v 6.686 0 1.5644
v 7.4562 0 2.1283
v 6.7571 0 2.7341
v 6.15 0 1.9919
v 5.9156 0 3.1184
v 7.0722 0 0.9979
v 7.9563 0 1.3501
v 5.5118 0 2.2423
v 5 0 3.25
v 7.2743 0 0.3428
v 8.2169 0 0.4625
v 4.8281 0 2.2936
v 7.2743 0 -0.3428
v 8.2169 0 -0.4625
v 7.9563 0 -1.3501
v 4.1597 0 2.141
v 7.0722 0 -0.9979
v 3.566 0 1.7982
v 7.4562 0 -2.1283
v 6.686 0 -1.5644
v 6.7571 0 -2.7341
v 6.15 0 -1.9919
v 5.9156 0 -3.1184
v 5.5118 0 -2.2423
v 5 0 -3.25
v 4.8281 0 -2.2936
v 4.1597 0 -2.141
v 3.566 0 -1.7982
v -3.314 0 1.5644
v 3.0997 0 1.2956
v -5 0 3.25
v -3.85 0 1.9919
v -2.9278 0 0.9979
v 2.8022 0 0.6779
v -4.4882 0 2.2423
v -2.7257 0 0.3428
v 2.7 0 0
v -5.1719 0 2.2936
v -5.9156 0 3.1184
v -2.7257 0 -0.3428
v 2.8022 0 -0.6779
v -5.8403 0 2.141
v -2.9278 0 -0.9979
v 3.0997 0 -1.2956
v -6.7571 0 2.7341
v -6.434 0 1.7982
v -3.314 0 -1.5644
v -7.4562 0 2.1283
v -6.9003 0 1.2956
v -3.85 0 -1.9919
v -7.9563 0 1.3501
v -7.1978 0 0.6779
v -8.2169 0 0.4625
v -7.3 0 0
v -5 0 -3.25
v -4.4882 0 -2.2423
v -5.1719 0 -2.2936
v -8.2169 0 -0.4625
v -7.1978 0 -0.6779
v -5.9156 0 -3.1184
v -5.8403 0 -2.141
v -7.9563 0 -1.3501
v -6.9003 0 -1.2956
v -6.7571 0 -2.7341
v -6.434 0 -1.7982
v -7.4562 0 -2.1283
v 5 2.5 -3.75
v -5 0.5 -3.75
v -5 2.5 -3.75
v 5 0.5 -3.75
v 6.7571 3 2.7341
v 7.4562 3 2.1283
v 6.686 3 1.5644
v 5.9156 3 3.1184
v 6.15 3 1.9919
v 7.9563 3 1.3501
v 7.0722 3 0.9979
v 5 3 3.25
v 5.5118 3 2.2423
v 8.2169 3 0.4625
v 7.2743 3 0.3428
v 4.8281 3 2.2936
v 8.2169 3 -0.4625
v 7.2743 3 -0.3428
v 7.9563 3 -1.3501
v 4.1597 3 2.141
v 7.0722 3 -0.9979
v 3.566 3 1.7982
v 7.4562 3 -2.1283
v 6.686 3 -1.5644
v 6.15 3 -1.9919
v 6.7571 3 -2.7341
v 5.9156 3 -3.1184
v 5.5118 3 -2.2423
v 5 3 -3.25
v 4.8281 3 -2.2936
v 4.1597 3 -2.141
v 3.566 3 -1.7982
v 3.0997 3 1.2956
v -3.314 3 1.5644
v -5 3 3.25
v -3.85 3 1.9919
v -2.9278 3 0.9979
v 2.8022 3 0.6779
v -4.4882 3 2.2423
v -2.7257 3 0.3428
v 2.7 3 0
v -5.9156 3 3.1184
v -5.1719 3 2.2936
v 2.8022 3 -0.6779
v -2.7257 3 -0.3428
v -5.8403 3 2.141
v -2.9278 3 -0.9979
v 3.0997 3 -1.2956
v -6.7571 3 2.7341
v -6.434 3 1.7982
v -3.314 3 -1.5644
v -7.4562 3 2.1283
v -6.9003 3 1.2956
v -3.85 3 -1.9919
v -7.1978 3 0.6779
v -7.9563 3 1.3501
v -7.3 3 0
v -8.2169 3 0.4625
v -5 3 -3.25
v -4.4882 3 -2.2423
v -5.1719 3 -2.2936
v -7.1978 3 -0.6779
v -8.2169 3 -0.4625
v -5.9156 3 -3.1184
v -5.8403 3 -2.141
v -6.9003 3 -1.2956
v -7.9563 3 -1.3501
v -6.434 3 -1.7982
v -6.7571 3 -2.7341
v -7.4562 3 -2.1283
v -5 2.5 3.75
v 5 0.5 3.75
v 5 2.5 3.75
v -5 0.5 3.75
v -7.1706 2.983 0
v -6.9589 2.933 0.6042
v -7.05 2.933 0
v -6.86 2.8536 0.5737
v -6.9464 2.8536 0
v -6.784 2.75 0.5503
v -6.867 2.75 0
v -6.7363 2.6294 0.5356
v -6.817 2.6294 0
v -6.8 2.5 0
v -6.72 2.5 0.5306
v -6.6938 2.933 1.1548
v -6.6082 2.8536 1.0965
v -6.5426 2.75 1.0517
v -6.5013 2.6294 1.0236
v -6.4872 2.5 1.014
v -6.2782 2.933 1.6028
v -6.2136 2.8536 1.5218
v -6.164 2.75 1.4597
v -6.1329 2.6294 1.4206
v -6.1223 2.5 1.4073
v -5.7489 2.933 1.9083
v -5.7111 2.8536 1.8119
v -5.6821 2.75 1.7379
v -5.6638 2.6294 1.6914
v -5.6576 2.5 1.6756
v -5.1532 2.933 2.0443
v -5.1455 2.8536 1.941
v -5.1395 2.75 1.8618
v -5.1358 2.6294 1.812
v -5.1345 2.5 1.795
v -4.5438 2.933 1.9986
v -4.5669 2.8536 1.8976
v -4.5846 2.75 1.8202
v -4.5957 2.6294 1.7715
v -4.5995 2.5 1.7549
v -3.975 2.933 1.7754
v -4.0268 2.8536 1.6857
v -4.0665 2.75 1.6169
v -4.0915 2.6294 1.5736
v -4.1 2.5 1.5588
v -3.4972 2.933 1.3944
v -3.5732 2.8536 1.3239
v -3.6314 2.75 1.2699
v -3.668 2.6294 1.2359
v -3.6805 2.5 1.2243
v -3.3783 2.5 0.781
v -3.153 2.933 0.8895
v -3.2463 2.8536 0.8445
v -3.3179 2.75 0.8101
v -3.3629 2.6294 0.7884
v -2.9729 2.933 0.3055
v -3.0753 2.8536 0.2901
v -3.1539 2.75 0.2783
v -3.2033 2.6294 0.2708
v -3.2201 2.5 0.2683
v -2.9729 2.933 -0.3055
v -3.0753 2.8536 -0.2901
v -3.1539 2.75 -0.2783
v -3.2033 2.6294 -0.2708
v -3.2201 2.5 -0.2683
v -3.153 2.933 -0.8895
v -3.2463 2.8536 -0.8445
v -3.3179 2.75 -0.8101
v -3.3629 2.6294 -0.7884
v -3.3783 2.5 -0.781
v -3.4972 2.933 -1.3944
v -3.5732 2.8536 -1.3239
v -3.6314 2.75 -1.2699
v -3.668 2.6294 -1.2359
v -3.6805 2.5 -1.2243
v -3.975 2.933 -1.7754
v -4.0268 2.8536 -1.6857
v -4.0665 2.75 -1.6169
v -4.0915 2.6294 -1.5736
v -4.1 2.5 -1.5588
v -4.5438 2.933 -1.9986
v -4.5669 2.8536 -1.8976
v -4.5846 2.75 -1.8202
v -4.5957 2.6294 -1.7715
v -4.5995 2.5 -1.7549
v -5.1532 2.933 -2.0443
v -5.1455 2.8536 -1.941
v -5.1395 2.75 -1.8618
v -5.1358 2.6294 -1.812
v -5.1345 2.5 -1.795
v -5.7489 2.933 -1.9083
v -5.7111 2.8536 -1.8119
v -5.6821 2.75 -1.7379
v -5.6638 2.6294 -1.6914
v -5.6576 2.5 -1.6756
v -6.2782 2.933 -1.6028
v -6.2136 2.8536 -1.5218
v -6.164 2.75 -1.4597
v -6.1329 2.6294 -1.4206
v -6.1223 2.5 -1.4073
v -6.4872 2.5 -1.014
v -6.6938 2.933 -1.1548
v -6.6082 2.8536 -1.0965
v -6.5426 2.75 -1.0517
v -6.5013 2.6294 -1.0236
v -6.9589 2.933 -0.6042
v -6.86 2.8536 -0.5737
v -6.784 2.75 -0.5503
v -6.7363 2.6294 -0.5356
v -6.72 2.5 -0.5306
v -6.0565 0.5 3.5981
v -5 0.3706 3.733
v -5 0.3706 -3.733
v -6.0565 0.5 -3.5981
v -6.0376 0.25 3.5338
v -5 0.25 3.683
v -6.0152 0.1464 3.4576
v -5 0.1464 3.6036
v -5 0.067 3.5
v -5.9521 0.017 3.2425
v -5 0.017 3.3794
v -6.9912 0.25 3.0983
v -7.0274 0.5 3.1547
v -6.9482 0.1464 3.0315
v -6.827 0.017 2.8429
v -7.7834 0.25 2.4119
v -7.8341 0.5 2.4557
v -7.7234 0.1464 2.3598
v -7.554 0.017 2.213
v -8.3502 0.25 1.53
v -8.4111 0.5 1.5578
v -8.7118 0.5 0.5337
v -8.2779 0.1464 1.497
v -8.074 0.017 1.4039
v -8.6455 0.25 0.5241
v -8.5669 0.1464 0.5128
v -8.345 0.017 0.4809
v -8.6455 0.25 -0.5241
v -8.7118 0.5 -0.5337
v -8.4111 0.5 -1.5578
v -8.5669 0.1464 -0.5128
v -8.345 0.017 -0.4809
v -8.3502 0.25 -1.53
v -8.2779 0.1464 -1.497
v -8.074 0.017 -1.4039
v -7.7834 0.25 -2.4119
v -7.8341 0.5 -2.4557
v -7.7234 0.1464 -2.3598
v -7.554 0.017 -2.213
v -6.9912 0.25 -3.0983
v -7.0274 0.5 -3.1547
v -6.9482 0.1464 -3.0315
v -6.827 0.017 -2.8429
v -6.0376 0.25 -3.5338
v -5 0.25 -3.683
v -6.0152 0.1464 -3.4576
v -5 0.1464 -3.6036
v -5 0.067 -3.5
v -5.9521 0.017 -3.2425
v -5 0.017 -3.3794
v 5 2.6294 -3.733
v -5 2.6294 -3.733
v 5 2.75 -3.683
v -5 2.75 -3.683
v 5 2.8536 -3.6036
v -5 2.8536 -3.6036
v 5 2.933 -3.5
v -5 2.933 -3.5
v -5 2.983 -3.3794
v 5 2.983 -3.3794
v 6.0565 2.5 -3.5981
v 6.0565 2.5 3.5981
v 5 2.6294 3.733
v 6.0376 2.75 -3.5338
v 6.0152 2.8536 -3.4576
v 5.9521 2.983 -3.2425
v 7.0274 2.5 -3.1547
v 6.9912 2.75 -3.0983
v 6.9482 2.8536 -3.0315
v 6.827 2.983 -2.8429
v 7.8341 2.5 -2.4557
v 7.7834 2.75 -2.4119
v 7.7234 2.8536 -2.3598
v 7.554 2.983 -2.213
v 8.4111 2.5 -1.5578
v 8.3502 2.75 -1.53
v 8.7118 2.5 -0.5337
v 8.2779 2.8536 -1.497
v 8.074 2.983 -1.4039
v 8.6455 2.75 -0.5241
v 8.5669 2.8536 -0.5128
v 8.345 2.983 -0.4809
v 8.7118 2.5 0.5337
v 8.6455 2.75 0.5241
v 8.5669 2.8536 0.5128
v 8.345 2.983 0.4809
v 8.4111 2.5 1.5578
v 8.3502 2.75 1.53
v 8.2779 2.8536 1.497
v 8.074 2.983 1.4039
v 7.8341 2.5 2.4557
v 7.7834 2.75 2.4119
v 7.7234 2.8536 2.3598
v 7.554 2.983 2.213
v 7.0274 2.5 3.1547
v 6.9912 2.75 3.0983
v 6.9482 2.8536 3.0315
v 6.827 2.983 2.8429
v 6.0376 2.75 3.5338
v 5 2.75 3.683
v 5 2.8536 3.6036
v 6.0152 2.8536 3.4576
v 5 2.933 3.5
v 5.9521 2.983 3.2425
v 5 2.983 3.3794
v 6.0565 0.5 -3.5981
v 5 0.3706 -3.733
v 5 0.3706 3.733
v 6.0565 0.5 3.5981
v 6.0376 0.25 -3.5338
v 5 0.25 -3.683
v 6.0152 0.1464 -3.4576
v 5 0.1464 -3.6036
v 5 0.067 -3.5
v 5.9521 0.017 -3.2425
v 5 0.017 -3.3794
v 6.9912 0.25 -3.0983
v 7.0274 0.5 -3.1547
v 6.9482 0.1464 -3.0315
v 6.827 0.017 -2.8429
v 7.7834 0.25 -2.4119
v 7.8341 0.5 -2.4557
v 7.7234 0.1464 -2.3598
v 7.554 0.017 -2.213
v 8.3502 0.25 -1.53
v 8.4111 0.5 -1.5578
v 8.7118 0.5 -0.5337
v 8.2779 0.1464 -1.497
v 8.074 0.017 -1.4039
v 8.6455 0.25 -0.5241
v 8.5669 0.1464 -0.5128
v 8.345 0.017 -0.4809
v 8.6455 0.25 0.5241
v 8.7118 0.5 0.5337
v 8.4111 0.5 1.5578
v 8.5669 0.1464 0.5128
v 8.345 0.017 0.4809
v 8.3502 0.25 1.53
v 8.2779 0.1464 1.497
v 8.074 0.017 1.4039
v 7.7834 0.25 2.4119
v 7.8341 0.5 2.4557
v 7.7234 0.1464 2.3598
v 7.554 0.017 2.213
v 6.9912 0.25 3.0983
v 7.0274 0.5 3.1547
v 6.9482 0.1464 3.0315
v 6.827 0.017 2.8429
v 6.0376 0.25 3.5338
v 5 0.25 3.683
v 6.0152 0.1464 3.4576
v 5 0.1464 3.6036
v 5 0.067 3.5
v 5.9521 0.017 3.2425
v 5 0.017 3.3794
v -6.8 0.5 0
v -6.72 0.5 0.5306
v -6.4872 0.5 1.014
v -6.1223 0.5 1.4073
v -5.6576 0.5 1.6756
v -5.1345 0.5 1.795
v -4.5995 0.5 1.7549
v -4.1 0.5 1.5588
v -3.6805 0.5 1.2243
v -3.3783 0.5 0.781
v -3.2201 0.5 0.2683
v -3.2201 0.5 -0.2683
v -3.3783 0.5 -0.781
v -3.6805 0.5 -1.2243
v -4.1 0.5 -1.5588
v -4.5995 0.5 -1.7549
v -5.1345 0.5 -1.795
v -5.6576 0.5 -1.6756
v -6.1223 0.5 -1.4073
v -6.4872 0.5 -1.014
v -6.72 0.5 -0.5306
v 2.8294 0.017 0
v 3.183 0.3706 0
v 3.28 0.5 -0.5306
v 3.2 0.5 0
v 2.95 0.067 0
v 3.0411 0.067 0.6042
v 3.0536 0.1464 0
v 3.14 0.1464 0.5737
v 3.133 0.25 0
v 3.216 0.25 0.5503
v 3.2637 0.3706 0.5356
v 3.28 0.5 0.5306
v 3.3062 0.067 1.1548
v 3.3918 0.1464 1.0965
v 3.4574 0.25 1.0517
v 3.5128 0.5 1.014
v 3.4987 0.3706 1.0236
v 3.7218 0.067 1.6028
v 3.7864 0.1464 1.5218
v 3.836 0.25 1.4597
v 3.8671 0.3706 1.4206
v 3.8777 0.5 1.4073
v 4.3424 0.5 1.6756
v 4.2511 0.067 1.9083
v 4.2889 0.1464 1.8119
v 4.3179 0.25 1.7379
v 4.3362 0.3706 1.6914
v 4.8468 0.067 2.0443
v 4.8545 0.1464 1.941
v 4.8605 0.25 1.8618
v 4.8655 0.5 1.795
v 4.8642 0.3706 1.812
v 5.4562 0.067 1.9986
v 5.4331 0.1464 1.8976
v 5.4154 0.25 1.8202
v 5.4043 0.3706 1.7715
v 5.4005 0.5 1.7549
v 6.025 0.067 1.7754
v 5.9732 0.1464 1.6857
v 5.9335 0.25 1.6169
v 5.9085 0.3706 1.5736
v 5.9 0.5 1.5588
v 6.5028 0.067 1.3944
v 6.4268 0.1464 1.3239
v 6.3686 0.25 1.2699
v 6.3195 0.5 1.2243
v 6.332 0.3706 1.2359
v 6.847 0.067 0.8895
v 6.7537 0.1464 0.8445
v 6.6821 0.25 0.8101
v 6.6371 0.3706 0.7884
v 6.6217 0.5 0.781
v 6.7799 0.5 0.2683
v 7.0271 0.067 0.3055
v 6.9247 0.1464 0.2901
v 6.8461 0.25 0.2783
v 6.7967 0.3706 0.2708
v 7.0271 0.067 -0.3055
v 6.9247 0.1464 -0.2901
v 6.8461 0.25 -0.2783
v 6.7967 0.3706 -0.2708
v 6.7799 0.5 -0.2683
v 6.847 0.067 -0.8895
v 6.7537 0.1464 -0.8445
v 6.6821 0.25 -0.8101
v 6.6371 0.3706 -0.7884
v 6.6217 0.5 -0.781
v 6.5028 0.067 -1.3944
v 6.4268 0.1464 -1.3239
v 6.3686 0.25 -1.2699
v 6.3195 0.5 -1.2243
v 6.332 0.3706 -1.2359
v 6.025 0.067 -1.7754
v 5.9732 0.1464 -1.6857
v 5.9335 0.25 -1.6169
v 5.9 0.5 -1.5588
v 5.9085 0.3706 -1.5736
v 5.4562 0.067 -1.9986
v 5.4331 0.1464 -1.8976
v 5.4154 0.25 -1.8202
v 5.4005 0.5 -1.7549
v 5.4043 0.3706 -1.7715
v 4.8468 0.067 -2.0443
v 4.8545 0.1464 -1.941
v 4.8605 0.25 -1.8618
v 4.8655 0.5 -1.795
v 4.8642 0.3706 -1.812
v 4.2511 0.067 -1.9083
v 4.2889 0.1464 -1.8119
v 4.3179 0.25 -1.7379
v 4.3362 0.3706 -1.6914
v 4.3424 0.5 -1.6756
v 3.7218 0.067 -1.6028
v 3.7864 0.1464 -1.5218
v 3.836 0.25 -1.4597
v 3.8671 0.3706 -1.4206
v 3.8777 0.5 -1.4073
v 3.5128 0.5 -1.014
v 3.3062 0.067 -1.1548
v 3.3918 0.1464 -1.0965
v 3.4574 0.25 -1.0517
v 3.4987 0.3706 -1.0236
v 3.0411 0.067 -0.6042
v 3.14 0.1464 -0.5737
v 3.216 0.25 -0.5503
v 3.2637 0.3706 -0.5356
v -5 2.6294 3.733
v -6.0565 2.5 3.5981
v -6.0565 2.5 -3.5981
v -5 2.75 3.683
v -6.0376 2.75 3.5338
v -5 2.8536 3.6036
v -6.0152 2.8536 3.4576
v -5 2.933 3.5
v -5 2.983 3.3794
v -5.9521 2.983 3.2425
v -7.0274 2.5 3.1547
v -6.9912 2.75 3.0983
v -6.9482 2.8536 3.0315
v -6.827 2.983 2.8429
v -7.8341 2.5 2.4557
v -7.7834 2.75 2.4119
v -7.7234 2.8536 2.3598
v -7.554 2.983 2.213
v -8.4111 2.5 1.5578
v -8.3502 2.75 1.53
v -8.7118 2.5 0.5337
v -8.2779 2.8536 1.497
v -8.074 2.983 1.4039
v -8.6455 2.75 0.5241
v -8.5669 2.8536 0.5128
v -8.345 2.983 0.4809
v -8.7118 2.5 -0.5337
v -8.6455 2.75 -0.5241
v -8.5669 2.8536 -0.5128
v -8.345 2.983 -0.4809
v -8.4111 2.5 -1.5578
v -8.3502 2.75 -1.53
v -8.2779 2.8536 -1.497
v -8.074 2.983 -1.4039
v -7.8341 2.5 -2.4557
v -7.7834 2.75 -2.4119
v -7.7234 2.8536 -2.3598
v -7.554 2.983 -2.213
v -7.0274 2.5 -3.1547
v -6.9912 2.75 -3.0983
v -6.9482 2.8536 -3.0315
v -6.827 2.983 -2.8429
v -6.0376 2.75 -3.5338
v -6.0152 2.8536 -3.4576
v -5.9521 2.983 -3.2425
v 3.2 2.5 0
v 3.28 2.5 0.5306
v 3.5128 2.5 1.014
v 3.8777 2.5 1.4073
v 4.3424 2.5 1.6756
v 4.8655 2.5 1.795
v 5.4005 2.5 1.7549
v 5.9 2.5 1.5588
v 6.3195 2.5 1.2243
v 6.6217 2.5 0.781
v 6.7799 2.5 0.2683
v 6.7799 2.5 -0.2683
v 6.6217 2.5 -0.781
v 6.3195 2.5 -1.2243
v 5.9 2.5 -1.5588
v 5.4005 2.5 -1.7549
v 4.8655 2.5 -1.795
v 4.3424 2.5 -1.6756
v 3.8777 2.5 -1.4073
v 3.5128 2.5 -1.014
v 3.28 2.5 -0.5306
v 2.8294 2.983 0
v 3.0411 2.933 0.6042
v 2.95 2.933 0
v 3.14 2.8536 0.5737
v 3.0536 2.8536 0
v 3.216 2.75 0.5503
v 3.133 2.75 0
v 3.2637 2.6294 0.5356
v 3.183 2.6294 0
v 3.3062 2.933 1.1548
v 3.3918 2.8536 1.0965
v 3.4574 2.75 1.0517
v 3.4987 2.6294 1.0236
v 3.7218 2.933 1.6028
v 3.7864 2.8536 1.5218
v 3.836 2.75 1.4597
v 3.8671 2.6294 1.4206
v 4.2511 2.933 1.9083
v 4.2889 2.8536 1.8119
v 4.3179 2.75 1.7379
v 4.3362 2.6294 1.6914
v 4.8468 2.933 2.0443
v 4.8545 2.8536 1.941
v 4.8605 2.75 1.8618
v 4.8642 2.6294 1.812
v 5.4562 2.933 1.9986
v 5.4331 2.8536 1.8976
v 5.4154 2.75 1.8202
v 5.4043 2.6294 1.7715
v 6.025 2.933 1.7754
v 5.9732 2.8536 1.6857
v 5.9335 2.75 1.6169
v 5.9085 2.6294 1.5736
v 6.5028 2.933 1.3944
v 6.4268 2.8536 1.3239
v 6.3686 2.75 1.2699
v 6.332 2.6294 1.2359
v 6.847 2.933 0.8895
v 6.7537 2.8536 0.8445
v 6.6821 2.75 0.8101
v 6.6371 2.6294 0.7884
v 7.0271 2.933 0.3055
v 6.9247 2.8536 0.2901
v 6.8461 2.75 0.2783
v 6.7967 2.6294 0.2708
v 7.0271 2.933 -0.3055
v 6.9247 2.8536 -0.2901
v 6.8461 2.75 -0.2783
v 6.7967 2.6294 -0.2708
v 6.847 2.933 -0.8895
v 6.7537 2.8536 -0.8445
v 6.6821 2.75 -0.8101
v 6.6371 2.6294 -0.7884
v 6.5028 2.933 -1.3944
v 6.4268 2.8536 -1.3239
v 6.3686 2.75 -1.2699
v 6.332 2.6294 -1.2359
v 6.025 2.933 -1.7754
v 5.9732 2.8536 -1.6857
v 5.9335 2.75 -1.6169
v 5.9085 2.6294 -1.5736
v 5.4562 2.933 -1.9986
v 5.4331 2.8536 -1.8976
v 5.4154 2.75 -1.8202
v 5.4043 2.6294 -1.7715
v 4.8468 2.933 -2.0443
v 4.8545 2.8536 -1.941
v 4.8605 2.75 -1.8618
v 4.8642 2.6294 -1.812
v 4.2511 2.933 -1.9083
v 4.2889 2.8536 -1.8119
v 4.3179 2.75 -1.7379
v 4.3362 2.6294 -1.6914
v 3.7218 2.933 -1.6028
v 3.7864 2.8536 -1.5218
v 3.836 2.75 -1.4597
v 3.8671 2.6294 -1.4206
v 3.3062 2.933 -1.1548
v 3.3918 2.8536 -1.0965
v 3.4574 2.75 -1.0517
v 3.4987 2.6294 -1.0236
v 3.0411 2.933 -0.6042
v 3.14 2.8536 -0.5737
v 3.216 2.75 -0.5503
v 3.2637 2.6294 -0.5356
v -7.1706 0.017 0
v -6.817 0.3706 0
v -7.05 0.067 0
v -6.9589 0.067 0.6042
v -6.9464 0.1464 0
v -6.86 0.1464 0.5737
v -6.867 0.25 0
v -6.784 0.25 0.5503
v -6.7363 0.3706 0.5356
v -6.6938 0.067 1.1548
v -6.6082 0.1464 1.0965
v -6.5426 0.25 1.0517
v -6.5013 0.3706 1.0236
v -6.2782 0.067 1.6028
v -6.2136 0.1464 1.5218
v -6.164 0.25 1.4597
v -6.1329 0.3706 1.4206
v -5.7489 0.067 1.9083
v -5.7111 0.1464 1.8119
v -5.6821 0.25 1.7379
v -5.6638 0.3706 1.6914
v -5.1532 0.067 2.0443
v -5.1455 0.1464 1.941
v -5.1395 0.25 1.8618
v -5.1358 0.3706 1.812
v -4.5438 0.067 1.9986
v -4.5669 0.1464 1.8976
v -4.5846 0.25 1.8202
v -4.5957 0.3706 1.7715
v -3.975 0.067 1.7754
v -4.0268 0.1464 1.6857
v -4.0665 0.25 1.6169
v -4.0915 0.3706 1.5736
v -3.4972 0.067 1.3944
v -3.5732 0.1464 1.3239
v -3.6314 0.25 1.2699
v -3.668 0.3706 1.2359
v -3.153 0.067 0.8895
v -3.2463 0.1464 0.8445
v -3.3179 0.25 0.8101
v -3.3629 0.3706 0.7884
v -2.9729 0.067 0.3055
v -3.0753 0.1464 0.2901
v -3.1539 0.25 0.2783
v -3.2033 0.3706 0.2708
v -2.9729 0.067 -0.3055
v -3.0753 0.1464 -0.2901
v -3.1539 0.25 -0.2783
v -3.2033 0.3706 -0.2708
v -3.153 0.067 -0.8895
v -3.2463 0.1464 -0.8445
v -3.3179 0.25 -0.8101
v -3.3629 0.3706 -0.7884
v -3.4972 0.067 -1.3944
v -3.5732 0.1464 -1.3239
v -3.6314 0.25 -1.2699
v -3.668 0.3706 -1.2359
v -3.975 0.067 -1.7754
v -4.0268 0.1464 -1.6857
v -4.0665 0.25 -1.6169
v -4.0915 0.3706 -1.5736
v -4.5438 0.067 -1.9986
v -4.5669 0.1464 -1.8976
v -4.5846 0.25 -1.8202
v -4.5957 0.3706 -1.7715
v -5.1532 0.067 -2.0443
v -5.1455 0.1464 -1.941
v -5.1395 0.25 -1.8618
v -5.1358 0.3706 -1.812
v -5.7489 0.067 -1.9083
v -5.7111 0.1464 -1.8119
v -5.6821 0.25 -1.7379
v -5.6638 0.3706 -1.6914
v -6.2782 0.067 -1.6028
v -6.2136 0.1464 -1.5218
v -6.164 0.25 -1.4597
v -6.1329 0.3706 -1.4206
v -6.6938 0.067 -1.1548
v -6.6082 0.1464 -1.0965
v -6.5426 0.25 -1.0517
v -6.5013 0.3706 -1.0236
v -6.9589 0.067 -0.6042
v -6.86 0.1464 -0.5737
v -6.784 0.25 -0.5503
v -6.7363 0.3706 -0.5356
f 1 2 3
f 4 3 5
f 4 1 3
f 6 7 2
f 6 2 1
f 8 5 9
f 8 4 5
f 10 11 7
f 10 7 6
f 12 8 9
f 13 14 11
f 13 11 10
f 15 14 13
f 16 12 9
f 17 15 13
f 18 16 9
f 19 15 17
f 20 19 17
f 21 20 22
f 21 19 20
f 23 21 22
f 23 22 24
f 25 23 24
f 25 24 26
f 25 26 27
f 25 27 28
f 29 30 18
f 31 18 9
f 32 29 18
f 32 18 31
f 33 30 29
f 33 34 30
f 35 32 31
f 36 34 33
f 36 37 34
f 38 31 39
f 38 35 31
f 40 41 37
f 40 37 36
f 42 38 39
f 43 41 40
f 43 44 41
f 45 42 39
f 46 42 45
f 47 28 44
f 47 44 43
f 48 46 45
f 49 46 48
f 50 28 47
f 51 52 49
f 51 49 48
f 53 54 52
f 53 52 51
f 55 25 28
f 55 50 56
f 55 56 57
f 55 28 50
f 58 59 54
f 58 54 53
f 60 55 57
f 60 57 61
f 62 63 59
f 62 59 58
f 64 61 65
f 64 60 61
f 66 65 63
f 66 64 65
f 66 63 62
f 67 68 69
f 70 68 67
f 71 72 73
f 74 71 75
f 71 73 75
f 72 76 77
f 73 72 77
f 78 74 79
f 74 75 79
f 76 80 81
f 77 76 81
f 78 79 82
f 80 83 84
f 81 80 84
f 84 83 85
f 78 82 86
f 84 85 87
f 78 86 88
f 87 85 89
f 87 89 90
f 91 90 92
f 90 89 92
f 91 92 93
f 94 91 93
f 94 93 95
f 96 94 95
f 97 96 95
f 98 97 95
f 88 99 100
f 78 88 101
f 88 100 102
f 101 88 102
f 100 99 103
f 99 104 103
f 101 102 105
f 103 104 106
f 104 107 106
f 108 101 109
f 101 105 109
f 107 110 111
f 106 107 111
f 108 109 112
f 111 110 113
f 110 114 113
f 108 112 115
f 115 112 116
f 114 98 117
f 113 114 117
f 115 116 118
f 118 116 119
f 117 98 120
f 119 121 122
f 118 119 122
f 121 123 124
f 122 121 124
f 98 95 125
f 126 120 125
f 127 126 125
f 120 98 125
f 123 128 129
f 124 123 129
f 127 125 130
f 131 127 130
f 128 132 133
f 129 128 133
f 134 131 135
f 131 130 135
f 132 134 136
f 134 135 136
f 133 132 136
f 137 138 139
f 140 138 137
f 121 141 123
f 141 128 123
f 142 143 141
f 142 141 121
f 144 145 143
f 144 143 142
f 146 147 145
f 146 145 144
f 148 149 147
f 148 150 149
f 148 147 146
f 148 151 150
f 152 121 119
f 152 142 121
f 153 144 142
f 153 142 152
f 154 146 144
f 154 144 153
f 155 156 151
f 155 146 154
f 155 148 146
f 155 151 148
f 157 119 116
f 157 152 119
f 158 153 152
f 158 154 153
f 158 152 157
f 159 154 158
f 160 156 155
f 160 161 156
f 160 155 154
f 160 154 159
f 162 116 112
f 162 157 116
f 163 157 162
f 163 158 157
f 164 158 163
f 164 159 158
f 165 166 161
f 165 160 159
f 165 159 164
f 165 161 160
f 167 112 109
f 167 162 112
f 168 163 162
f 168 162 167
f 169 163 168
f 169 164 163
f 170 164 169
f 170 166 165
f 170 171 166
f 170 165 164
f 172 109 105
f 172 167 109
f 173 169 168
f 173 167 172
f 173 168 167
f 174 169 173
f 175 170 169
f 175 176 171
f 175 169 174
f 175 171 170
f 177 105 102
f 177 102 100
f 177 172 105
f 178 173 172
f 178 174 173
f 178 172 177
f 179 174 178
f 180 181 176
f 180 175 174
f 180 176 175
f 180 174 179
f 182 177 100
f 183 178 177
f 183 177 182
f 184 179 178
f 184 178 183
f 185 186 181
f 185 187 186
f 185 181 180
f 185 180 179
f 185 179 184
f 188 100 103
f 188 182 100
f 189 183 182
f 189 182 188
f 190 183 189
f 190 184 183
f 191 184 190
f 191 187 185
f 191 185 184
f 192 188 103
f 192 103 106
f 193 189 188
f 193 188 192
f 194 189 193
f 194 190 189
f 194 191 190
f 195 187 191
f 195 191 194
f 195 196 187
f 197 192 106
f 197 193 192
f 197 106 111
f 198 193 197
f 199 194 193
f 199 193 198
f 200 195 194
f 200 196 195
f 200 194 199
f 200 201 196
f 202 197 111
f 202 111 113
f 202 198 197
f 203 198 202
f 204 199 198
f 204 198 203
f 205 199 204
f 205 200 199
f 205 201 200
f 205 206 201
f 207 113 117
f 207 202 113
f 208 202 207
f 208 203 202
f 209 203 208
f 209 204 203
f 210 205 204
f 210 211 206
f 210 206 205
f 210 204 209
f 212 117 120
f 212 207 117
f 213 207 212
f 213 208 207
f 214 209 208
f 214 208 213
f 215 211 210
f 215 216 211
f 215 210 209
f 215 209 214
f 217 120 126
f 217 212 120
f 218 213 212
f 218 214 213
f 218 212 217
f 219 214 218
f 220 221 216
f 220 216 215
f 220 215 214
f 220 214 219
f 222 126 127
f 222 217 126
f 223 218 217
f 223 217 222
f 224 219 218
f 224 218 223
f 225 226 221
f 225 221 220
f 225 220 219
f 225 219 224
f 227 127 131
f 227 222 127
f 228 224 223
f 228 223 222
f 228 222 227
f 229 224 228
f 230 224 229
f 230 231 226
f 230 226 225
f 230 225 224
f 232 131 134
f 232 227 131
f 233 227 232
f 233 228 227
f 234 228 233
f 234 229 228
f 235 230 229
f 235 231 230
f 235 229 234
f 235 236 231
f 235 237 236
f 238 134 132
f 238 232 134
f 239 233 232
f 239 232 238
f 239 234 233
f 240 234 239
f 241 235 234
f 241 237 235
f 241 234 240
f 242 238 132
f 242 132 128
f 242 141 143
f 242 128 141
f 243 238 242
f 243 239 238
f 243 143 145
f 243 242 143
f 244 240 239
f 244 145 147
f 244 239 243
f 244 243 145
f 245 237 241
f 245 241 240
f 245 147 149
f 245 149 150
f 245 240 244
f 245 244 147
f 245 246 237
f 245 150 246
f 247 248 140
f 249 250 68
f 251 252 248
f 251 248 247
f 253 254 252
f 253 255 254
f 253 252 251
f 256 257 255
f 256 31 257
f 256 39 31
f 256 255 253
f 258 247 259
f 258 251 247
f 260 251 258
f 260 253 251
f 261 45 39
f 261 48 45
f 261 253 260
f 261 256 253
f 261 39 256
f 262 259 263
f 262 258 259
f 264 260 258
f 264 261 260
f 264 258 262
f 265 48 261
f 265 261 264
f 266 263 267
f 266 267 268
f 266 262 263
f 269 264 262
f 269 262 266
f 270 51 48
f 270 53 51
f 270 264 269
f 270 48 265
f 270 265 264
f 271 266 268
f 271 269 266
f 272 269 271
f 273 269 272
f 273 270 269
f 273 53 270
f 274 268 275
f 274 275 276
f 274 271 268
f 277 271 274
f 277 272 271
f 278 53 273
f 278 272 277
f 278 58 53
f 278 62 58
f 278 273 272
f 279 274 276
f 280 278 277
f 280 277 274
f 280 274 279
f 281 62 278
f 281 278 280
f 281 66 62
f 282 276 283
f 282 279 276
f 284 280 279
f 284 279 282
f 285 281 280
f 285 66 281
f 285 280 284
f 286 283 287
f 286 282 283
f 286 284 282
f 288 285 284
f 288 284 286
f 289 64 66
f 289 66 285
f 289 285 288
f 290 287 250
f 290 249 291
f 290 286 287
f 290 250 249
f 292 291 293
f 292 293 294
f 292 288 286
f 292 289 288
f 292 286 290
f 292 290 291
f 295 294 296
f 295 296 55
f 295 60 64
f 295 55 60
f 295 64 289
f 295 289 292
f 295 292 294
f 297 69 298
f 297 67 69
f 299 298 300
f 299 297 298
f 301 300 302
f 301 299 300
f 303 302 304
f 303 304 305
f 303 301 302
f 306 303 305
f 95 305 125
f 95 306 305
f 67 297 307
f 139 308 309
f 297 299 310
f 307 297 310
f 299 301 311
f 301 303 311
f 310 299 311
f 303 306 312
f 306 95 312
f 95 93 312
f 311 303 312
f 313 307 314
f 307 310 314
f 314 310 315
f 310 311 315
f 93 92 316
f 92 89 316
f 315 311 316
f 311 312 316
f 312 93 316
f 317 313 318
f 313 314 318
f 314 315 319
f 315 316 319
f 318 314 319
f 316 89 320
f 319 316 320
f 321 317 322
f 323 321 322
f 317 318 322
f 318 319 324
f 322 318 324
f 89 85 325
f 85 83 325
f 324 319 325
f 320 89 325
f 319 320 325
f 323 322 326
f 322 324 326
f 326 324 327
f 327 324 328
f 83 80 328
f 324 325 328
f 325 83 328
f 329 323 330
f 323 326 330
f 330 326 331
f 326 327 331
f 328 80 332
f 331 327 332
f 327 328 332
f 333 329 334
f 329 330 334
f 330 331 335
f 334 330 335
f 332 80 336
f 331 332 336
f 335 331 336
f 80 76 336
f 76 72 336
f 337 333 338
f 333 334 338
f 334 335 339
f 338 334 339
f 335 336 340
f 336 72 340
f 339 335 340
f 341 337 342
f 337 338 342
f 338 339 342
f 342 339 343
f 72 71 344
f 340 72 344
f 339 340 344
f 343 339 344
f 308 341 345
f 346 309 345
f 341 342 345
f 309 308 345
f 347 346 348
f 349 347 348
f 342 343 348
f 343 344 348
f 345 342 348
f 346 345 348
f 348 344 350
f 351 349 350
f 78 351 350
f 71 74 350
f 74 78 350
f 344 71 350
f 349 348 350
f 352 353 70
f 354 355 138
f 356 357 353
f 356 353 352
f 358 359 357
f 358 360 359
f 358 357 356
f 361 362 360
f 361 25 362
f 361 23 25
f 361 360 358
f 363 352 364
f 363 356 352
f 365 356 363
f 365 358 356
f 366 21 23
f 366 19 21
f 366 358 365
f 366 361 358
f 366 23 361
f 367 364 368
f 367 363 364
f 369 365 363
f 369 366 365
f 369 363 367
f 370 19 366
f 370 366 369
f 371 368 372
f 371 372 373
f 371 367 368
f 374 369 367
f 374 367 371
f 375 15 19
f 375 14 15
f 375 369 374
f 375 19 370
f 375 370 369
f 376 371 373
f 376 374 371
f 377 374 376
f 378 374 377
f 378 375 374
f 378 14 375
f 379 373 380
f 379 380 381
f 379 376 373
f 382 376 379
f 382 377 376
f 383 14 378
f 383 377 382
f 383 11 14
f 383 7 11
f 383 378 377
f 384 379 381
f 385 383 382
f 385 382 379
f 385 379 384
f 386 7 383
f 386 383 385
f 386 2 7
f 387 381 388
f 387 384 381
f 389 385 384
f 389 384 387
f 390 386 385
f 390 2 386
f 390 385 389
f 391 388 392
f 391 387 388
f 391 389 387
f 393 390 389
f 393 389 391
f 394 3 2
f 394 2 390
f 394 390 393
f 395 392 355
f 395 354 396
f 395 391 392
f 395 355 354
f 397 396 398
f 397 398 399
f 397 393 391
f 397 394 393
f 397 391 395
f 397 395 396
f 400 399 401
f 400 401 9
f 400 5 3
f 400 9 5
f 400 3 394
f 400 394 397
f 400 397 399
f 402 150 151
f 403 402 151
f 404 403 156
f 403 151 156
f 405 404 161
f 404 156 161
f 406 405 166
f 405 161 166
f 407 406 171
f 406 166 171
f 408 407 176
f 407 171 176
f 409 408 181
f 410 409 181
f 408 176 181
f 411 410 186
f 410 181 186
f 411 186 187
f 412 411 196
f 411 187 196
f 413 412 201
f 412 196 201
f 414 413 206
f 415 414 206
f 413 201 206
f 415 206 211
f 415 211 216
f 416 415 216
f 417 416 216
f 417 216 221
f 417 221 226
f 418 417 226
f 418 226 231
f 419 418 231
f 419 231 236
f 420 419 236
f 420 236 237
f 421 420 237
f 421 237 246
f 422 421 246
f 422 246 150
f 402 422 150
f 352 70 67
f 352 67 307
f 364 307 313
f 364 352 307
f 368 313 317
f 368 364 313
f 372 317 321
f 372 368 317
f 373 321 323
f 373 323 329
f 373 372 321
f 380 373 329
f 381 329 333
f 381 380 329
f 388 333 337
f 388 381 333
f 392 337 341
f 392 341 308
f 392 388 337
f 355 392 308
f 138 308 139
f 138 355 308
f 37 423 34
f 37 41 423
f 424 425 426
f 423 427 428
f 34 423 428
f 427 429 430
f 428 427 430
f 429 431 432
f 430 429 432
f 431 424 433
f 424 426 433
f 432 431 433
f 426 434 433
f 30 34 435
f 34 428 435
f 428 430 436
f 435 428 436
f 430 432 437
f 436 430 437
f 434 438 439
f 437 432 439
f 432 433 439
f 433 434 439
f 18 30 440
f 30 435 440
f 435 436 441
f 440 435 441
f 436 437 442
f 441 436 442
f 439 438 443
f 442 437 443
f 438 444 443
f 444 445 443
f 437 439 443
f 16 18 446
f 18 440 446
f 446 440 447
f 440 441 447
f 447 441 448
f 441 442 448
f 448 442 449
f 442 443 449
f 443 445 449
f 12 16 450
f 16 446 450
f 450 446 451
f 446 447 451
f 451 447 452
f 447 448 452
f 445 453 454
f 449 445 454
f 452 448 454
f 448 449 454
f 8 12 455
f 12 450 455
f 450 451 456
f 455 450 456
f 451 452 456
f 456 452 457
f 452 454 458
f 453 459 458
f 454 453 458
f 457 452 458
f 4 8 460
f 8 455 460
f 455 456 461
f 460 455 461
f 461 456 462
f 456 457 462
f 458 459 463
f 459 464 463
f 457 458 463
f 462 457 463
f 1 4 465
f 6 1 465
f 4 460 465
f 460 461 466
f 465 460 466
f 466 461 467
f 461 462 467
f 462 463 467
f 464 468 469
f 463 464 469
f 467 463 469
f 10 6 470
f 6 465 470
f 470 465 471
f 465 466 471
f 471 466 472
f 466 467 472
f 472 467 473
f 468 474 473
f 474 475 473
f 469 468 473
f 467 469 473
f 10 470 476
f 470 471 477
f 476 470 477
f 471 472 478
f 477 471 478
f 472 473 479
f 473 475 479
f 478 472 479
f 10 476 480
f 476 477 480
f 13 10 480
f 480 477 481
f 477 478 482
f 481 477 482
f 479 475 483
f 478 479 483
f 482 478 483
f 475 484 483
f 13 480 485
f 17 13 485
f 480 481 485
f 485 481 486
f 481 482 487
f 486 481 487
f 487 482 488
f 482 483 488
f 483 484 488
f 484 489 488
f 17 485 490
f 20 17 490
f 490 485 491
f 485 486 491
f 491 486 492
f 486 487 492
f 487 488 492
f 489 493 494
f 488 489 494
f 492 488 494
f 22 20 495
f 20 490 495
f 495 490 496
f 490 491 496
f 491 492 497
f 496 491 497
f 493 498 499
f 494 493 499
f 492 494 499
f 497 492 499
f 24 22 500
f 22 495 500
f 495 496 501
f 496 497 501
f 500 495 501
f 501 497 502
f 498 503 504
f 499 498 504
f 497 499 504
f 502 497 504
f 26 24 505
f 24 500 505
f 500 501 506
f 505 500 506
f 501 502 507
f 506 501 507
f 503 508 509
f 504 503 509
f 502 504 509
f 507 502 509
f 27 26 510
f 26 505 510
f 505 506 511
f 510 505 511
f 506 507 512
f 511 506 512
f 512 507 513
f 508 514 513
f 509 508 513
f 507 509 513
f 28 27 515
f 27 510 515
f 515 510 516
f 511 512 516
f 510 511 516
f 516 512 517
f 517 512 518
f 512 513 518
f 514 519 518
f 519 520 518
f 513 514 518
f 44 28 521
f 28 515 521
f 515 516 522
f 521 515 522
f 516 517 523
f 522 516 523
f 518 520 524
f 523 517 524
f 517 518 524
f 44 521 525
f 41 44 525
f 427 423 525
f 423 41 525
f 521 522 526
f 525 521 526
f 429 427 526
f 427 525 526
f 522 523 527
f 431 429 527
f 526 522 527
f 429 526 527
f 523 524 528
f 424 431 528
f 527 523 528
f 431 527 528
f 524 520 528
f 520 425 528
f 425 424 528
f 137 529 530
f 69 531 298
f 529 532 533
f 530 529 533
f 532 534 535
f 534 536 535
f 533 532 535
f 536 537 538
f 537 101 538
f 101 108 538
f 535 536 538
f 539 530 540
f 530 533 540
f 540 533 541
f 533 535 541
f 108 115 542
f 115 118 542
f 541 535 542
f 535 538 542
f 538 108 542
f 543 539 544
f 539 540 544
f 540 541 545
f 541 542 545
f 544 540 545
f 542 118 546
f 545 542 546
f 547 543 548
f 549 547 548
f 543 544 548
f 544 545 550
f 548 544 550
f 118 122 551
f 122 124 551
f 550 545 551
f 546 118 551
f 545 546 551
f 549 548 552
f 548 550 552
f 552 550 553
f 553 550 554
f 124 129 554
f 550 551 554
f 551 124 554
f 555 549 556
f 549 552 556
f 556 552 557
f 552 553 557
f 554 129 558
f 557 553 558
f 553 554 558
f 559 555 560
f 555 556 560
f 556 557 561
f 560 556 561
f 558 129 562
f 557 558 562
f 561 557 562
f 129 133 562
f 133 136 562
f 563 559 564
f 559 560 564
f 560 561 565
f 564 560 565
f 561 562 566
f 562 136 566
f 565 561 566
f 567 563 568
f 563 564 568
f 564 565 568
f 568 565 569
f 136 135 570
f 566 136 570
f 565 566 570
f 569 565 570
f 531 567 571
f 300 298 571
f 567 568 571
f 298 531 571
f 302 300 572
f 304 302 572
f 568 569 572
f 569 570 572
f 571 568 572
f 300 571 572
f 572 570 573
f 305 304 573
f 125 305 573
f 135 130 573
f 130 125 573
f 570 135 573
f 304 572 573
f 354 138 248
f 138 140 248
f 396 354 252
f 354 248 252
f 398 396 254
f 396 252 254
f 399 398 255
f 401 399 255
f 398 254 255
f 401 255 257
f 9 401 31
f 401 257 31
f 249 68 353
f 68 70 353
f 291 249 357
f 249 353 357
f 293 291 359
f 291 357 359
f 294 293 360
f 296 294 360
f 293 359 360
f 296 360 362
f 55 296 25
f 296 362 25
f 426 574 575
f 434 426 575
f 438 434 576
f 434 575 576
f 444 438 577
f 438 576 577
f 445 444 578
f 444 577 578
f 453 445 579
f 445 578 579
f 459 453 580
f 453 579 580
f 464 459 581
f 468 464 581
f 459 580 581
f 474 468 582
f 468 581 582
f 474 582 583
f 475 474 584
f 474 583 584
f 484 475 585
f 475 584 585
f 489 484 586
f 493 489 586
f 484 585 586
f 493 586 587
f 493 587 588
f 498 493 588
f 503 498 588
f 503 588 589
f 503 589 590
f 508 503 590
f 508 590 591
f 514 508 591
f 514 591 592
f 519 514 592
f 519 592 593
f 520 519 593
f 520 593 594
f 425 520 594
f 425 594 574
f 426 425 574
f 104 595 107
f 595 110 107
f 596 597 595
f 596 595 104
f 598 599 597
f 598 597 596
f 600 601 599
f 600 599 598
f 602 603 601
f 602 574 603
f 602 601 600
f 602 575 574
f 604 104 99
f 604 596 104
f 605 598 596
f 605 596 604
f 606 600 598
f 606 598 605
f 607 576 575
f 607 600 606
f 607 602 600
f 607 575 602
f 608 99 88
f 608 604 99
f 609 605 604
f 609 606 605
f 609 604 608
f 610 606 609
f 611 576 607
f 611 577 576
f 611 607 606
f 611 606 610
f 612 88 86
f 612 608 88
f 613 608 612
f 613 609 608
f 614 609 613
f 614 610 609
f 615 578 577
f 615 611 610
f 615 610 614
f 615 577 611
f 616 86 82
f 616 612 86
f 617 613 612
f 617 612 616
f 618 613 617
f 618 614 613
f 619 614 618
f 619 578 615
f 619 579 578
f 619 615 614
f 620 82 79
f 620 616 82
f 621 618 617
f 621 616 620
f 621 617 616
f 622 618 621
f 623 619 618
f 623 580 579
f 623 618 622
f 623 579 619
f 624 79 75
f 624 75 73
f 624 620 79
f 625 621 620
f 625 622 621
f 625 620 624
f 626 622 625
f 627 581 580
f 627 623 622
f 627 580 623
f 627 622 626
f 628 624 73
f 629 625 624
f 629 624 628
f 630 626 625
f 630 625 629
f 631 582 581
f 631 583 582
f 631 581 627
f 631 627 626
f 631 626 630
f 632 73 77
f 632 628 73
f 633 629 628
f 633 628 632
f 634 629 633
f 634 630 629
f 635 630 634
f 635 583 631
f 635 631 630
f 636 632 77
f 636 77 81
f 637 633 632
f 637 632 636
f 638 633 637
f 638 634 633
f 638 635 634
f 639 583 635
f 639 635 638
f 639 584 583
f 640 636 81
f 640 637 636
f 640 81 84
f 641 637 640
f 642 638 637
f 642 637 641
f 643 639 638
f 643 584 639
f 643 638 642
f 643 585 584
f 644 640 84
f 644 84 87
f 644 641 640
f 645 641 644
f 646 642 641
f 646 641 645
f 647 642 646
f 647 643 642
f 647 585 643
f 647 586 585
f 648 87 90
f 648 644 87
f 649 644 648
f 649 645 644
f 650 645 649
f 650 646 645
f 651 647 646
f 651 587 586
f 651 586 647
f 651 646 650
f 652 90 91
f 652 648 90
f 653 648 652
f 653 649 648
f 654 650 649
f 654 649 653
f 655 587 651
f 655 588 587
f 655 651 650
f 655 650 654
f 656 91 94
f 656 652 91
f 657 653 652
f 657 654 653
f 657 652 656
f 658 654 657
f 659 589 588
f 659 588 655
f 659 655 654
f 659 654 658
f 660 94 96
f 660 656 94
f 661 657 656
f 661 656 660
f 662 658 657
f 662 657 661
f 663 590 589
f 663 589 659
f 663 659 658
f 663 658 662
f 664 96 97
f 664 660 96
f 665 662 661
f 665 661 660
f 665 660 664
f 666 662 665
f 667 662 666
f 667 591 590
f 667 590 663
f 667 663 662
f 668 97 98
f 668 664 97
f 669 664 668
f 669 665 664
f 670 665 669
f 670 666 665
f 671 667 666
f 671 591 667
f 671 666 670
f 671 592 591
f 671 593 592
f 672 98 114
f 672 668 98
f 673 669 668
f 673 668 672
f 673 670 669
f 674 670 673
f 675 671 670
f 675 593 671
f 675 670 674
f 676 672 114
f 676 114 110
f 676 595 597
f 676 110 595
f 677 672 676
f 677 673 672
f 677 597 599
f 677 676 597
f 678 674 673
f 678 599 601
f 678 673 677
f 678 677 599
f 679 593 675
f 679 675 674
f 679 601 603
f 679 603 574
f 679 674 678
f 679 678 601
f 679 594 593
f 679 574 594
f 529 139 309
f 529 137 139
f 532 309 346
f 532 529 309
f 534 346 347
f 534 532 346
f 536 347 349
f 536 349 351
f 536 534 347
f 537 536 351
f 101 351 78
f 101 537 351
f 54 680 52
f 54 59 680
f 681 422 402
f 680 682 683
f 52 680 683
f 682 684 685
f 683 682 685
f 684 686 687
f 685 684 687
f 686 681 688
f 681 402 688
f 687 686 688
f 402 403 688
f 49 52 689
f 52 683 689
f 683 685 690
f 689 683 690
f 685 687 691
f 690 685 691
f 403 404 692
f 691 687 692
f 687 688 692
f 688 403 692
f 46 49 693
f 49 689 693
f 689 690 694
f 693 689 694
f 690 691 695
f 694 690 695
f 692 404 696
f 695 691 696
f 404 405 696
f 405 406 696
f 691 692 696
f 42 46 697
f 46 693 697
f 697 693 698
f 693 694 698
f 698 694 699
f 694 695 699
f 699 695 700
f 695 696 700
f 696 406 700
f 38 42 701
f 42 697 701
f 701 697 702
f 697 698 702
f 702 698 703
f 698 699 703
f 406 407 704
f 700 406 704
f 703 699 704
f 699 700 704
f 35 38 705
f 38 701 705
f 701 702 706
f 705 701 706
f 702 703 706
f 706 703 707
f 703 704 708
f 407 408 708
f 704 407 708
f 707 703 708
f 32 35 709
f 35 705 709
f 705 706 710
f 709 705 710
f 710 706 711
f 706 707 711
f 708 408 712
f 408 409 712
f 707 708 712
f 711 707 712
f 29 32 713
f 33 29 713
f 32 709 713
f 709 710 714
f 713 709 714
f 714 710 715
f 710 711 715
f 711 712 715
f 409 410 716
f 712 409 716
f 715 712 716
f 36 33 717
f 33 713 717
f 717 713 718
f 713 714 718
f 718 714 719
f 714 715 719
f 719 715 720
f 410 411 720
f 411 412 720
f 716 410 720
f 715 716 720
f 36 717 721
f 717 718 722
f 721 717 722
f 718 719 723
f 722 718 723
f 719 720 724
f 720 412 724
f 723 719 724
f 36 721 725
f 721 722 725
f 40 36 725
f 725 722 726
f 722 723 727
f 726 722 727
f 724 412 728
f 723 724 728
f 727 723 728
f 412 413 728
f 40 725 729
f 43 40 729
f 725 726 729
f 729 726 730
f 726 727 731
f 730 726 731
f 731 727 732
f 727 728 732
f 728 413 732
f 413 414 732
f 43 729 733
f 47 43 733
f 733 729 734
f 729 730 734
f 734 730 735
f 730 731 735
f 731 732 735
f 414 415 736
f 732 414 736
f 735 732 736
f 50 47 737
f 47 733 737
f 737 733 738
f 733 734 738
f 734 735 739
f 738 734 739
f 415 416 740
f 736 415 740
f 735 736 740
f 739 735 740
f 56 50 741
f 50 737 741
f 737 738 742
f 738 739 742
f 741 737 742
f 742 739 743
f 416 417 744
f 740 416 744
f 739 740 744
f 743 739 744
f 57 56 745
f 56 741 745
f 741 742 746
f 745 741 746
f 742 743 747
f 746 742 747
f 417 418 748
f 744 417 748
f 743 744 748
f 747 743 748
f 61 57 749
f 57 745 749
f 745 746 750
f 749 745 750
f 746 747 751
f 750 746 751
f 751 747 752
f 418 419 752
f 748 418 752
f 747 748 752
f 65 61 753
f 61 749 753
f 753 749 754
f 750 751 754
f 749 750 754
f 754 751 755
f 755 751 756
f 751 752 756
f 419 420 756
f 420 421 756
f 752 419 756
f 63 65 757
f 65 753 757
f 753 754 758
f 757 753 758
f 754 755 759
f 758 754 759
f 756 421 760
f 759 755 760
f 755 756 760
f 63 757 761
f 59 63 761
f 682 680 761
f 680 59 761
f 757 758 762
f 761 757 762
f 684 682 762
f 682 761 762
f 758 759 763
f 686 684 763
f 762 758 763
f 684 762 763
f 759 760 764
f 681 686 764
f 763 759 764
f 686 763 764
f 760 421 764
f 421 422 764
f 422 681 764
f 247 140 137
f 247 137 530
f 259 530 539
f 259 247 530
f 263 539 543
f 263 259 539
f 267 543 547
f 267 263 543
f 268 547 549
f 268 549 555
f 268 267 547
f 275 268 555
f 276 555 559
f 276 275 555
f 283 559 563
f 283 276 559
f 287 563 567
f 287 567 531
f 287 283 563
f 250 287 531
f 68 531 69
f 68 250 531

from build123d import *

# Parameters (mm, degrees)
BOSS_EXTRUDE1_DEPTH  = 3
M3_CLEARANCE_HOLE1_D = 3.6
FILLET1_R            = 0.5


with BuildPart() as part:
    # Sketch1 → Boss-Extrude1 (new body)
    with BuildSketch(Plane(origin=(0, 0, 0), x_dir=(1, 0, 0), z_dir=(0, 1, 0))):
        with BuildLine():
            Line((-5, 3.75), (5, 3.75))
            ThreePointArc((5, 3.75), (8.75, 0), (5, -3.75))
            Line((5, -3.75), (-5, -3.75))
            ThreePointArc((-5, -3.75), (-8.75, 0), (-5, 3.75))
        make_face()
    extrude(amount=BOSS_EXTRUDE1_DEPTH)

    # M3 Clearance Hole1 (through all)
    with Locations(Plane.XZ):
        with Locations((-5, 0), (5, 0)):
            Hole(M3_CLEARANCE_HOLE1_D / 2)

    # Fillet1
    fillet1_edges = [part.edges().sort_by_distance(p)[0] for p in [
        (8.75, 3, 0),
        (6.8, 0, 0),
        (6.8, 3, 0),
        (0, 3, -3.75),
        (-3.2, 0, 0),
        (-3.2, 3, 0),
        (-8.75, 3, 0),
        (0, 0, -3.75),
        (8.75, 0, 0),
        (0, 0, 3.75),
        (-8.75, 0, 0),
        (0, 3, 3.75),
    ]]
    fillet(fillet1_edges, radius=FILLET1_R)


solid = part.part
